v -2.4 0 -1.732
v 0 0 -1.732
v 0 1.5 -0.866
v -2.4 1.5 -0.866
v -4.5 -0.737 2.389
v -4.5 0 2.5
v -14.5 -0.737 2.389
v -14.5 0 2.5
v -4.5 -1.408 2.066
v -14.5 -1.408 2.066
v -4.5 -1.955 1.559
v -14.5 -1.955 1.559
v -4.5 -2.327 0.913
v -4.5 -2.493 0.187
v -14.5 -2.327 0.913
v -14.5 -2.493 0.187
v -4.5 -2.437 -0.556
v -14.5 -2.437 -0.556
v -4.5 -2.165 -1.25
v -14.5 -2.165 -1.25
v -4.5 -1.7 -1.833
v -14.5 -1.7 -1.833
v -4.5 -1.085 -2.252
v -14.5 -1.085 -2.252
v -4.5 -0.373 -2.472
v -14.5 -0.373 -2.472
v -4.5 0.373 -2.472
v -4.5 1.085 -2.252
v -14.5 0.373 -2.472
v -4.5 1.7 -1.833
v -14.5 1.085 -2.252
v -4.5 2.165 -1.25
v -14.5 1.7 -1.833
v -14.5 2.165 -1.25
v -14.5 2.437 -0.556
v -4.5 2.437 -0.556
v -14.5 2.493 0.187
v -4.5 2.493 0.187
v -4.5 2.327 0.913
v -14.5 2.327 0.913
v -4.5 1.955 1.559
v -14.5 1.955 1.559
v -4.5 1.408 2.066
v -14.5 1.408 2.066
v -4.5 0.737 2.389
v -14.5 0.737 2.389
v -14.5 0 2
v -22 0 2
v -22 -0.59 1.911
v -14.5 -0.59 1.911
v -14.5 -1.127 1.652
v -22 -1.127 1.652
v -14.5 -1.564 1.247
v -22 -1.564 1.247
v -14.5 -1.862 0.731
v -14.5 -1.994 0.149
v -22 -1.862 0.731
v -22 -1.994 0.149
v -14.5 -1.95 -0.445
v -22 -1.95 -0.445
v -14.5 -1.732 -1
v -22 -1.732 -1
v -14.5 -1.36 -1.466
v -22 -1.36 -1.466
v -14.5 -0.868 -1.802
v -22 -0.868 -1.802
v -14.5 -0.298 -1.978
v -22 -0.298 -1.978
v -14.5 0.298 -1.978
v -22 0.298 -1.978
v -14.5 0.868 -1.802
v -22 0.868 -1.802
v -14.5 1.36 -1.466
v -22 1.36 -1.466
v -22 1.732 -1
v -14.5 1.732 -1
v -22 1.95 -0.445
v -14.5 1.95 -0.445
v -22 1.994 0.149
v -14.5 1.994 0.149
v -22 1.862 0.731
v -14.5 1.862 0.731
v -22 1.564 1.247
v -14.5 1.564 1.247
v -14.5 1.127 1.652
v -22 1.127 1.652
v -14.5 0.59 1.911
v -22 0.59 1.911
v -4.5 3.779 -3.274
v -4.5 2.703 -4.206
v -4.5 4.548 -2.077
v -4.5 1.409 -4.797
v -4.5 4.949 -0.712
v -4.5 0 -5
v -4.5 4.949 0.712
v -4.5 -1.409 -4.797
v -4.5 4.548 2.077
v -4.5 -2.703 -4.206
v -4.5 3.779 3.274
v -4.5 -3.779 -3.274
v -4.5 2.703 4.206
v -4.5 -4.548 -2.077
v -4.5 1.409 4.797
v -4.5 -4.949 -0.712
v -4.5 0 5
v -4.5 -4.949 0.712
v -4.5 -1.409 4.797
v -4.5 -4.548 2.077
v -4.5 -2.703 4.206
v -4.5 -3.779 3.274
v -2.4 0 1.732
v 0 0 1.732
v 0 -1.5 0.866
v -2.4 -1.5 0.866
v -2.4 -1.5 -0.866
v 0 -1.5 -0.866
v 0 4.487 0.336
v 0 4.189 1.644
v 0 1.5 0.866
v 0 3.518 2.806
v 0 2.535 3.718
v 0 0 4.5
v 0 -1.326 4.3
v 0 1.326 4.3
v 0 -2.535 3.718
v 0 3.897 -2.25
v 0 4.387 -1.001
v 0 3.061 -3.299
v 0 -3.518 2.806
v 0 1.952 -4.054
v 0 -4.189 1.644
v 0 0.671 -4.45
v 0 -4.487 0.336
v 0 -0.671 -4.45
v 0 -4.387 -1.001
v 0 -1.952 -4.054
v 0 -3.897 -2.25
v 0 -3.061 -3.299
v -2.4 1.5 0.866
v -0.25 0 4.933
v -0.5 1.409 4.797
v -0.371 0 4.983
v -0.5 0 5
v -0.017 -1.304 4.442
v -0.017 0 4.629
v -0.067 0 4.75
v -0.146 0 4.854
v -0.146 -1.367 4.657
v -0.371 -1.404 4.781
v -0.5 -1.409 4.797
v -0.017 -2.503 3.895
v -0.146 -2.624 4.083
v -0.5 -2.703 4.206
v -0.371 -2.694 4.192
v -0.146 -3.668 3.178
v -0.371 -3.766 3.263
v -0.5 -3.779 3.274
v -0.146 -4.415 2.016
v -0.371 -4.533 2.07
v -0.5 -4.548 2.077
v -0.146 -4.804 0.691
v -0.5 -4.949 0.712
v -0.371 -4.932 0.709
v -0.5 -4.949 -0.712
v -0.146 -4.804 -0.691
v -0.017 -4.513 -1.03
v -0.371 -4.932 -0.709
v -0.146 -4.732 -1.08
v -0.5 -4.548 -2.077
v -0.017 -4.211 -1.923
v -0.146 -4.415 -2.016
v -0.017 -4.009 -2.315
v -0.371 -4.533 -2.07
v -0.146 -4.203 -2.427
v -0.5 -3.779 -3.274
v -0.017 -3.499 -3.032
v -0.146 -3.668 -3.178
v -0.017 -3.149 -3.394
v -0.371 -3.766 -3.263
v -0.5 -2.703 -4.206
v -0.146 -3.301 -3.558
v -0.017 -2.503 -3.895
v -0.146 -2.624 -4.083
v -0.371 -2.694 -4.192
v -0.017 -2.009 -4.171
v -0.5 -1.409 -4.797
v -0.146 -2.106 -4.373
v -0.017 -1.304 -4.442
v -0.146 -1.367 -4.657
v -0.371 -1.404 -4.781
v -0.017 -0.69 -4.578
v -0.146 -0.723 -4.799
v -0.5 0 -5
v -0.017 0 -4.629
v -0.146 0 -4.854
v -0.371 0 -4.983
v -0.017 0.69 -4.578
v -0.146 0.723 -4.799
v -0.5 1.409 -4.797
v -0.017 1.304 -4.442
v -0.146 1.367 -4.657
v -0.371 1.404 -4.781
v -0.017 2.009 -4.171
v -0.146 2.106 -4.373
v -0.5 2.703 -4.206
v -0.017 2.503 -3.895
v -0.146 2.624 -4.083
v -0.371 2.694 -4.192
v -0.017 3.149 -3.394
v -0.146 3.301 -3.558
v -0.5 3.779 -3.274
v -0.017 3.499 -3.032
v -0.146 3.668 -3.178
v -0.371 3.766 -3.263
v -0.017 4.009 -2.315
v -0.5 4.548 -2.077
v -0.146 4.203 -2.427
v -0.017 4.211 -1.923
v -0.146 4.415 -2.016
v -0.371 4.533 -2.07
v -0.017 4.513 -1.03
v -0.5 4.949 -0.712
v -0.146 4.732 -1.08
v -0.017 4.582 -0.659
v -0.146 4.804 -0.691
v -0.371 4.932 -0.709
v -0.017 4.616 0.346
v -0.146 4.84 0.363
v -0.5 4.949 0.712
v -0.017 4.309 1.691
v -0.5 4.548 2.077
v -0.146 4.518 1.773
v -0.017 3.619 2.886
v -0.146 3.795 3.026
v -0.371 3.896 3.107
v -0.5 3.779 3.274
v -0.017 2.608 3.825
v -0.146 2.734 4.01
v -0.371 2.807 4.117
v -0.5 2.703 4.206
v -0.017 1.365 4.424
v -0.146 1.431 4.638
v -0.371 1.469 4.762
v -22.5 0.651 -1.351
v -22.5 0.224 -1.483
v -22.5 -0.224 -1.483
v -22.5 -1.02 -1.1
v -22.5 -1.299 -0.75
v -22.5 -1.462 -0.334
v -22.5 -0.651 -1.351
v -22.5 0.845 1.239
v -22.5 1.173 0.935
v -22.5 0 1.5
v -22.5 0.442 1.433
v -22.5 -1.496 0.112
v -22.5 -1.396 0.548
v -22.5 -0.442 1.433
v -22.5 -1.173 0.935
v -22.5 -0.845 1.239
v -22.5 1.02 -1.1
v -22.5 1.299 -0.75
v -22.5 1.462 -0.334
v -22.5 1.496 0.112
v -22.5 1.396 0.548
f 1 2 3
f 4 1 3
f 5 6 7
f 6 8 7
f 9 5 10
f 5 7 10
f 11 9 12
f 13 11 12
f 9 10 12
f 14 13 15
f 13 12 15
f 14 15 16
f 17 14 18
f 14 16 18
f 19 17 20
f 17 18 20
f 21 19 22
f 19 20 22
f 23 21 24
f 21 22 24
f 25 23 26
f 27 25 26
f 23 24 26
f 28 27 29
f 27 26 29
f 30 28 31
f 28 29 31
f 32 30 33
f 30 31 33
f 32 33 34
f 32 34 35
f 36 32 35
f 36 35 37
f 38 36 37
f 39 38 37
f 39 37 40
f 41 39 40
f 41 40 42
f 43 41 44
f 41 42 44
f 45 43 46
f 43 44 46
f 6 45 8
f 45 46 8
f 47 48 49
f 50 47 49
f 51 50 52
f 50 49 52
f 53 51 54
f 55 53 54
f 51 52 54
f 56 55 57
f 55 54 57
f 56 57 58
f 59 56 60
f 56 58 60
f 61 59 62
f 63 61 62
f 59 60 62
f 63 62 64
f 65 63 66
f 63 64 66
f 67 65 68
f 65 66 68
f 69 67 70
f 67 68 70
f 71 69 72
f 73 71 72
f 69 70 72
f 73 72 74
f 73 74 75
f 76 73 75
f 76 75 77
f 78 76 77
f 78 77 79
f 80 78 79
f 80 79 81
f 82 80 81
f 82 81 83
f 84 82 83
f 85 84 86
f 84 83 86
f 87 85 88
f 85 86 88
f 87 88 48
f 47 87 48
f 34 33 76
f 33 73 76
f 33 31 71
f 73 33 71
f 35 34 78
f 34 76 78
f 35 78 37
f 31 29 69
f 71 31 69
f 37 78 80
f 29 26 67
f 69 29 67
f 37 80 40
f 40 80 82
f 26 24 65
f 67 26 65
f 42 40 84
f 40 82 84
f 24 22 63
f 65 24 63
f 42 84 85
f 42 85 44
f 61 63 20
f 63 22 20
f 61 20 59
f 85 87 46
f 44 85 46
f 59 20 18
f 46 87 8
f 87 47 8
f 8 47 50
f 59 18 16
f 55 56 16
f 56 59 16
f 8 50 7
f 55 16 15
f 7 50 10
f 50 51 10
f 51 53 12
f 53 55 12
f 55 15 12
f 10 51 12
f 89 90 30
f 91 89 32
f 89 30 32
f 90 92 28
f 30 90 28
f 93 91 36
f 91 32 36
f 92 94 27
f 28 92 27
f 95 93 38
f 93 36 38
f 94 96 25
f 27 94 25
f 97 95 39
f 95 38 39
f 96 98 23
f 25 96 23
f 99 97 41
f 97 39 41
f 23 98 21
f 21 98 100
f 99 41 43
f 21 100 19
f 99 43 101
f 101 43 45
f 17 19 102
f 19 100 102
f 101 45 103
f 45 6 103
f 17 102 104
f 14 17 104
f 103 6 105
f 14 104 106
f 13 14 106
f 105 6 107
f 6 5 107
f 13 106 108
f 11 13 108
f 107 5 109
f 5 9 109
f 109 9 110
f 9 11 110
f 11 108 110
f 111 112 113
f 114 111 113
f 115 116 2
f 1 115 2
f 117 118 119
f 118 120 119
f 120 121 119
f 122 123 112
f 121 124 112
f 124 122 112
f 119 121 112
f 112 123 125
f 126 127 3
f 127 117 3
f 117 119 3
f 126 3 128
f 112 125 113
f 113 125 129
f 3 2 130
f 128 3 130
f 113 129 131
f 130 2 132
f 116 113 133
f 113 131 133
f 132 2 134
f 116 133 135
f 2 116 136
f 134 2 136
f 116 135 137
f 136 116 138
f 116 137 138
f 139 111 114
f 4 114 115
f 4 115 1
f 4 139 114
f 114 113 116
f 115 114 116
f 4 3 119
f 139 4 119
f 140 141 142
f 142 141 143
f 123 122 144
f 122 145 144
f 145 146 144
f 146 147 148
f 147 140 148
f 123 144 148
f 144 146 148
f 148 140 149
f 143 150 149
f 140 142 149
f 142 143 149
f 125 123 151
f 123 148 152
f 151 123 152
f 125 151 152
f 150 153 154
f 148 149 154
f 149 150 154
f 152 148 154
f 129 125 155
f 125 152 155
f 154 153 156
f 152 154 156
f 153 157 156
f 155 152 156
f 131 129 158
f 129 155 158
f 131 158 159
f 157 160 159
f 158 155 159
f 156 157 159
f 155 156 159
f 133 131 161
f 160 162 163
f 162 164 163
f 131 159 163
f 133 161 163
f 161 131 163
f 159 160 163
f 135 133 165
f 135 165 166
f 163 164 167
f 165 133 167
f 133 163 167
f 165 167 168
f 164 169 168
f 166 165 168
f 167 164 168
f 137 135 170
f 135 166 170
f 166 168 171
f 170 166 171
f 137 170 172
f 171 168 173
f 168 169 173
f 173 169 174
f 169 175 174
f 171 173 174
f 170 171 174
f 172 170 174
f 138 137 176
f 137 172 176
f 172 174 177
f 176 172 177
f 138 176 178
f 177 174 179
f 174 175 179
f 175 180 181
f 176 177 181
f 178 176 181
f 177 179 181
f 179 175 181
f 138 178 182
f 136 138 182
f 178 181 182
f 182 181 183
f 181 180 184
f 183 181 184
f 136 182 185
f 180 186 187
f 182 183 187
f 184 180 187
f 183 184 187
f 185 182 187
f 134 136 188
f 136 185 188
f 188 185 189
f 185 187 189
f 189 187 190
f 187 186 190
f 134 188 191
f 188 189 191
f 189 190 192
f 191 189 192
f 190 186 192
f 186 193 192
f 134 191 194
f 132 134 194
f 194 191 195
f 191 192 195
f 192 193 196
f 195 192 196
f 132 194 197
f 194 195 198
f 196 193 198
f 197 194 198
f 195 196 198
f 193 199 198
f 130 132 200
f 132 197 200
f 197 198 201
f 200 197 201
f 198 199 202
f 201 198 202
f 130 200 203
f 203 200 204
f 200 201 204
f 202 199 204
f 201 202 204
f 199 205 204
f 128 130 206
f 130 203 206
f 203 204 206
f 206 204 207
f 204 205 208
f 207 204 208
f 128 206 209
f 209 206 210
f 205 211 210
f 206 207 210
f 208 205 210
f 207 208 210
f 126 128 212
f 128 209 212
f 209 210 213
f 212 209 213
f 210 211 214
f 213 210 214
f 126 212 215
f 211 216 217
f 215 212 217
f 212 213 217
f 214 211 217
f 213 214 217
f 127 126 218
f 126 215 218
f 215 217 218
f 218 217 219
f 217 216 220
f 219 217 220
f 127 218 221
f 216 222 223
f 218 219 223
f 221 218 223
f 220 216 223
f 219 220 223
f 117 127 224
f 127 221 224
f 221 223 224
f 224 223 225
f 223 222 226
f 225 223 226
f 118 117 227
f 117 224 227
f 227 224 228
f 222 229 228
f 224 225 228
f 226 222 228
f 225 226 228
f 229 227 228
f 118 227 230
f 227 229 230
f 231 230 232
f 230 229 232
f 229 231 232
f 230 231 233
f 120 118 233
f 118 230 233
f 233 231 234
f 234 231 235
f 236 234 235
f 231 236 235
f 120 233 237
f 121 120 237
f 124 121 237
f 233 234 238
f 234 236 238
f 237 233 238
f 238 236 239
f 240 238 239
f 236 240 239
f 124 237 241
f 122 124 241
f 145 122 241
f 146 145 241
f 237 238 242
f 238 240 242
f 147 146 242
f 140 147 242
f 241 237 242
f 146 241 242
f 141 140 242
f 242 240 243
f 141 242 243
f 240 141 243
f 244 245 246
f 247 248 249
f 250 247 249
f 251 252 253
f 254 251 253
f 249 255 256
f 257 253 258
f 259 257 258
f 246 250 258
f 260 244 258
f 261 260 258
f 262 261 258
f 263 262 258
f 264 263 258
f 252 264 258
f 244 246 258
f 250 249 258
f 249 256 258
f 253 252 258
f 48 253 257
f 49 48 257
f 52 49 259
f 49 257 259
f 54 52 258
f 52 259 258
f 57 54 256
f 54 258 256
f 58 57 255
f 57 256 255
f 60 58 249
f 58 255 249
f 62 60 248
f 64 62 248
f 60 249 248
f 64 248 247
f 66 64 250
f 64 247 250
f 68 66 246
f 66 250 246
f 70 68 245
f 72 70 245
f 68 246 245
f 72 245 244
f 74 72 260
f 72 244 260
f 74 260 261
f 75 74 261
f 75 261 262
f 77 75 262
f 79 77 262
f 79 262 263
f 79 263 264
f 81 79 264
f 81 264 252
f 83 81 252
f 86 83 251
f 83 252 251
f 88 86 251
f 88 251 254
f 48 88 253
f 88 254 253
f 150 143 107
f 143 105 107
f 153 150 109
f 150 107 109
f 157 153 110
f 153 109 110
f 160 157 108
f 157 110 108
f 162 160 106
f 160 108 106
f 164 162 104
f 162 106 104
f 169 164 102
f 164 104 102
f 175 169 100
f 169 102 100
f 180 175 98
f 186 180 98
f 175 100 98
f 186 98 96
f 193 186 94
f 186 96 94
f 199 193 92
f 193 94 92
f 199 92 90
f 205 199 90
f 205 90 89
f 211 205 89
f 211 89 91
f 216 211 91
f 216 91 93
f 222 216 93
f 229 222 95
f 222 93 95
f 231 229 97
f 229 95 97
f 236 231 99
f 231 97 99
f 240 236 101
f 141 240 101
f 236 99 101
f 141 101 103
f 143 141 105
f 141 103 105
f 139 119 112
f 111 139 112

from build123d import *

# Parameters (mm, degrees)
CHAMFER1_SIZE      = 0.5
CUT_EXTRUDE1_DEPTH = 2.4


with BuildPart() as part:
    # Sketch1 → Revolve1 (revolve)
    with BuildSketch(Plane.XY):
        with BuildLine():
            Line((0, 0), (0, 4.5))
            ThreePointArc((0, 4.5), (-0.146446609, 4.853553391), (-0.5, 5))
            Line((-0.5, 5), (-4.5, 5))
            Line((-4.5, 5), (-4.5, 2.5))
            Line((-4.5, 2.5), (-14.5, 2.5))
            Line((-14.5, 2.5), (-14.5, 2))
            Line((-14.5, 2), (-22.5, 2))
            Line((-22.5, 2), (-22.5, 0))
            Line((-22.5, 0), (0, 0))
        make_face()
    revolve(axis=Axis((0, 0, 0), (1, 0, 0)))

    # Chamfer1
    chamfer1_edges = [part.edges().sort_by_distance(p)[0] for p in [
        (-22.5, -2, 0),
    ]]
    chamfer(chamfer1_edges, length=CHAMFER1_SIZE)

    # Sketch2 → Cut-Extrude1 (cut)
    with BuildSketch(Plane(origin=(0, 0, 0), x_dir=(0, 0, -1), z_dir=(1, 0, 0))):
        Polygon((1.732050808, 0), (0.866025404, 1.5), (-0.866025404, 1.5), (-1.732050808, 0), (-0.866025404, -1.5), (0.866025404, -1.5), align=None)
    extrude(amount=-CUT_EXTRUDE1_DEPTH, mode=Mode.SUBTRACT)


solid = part.part
